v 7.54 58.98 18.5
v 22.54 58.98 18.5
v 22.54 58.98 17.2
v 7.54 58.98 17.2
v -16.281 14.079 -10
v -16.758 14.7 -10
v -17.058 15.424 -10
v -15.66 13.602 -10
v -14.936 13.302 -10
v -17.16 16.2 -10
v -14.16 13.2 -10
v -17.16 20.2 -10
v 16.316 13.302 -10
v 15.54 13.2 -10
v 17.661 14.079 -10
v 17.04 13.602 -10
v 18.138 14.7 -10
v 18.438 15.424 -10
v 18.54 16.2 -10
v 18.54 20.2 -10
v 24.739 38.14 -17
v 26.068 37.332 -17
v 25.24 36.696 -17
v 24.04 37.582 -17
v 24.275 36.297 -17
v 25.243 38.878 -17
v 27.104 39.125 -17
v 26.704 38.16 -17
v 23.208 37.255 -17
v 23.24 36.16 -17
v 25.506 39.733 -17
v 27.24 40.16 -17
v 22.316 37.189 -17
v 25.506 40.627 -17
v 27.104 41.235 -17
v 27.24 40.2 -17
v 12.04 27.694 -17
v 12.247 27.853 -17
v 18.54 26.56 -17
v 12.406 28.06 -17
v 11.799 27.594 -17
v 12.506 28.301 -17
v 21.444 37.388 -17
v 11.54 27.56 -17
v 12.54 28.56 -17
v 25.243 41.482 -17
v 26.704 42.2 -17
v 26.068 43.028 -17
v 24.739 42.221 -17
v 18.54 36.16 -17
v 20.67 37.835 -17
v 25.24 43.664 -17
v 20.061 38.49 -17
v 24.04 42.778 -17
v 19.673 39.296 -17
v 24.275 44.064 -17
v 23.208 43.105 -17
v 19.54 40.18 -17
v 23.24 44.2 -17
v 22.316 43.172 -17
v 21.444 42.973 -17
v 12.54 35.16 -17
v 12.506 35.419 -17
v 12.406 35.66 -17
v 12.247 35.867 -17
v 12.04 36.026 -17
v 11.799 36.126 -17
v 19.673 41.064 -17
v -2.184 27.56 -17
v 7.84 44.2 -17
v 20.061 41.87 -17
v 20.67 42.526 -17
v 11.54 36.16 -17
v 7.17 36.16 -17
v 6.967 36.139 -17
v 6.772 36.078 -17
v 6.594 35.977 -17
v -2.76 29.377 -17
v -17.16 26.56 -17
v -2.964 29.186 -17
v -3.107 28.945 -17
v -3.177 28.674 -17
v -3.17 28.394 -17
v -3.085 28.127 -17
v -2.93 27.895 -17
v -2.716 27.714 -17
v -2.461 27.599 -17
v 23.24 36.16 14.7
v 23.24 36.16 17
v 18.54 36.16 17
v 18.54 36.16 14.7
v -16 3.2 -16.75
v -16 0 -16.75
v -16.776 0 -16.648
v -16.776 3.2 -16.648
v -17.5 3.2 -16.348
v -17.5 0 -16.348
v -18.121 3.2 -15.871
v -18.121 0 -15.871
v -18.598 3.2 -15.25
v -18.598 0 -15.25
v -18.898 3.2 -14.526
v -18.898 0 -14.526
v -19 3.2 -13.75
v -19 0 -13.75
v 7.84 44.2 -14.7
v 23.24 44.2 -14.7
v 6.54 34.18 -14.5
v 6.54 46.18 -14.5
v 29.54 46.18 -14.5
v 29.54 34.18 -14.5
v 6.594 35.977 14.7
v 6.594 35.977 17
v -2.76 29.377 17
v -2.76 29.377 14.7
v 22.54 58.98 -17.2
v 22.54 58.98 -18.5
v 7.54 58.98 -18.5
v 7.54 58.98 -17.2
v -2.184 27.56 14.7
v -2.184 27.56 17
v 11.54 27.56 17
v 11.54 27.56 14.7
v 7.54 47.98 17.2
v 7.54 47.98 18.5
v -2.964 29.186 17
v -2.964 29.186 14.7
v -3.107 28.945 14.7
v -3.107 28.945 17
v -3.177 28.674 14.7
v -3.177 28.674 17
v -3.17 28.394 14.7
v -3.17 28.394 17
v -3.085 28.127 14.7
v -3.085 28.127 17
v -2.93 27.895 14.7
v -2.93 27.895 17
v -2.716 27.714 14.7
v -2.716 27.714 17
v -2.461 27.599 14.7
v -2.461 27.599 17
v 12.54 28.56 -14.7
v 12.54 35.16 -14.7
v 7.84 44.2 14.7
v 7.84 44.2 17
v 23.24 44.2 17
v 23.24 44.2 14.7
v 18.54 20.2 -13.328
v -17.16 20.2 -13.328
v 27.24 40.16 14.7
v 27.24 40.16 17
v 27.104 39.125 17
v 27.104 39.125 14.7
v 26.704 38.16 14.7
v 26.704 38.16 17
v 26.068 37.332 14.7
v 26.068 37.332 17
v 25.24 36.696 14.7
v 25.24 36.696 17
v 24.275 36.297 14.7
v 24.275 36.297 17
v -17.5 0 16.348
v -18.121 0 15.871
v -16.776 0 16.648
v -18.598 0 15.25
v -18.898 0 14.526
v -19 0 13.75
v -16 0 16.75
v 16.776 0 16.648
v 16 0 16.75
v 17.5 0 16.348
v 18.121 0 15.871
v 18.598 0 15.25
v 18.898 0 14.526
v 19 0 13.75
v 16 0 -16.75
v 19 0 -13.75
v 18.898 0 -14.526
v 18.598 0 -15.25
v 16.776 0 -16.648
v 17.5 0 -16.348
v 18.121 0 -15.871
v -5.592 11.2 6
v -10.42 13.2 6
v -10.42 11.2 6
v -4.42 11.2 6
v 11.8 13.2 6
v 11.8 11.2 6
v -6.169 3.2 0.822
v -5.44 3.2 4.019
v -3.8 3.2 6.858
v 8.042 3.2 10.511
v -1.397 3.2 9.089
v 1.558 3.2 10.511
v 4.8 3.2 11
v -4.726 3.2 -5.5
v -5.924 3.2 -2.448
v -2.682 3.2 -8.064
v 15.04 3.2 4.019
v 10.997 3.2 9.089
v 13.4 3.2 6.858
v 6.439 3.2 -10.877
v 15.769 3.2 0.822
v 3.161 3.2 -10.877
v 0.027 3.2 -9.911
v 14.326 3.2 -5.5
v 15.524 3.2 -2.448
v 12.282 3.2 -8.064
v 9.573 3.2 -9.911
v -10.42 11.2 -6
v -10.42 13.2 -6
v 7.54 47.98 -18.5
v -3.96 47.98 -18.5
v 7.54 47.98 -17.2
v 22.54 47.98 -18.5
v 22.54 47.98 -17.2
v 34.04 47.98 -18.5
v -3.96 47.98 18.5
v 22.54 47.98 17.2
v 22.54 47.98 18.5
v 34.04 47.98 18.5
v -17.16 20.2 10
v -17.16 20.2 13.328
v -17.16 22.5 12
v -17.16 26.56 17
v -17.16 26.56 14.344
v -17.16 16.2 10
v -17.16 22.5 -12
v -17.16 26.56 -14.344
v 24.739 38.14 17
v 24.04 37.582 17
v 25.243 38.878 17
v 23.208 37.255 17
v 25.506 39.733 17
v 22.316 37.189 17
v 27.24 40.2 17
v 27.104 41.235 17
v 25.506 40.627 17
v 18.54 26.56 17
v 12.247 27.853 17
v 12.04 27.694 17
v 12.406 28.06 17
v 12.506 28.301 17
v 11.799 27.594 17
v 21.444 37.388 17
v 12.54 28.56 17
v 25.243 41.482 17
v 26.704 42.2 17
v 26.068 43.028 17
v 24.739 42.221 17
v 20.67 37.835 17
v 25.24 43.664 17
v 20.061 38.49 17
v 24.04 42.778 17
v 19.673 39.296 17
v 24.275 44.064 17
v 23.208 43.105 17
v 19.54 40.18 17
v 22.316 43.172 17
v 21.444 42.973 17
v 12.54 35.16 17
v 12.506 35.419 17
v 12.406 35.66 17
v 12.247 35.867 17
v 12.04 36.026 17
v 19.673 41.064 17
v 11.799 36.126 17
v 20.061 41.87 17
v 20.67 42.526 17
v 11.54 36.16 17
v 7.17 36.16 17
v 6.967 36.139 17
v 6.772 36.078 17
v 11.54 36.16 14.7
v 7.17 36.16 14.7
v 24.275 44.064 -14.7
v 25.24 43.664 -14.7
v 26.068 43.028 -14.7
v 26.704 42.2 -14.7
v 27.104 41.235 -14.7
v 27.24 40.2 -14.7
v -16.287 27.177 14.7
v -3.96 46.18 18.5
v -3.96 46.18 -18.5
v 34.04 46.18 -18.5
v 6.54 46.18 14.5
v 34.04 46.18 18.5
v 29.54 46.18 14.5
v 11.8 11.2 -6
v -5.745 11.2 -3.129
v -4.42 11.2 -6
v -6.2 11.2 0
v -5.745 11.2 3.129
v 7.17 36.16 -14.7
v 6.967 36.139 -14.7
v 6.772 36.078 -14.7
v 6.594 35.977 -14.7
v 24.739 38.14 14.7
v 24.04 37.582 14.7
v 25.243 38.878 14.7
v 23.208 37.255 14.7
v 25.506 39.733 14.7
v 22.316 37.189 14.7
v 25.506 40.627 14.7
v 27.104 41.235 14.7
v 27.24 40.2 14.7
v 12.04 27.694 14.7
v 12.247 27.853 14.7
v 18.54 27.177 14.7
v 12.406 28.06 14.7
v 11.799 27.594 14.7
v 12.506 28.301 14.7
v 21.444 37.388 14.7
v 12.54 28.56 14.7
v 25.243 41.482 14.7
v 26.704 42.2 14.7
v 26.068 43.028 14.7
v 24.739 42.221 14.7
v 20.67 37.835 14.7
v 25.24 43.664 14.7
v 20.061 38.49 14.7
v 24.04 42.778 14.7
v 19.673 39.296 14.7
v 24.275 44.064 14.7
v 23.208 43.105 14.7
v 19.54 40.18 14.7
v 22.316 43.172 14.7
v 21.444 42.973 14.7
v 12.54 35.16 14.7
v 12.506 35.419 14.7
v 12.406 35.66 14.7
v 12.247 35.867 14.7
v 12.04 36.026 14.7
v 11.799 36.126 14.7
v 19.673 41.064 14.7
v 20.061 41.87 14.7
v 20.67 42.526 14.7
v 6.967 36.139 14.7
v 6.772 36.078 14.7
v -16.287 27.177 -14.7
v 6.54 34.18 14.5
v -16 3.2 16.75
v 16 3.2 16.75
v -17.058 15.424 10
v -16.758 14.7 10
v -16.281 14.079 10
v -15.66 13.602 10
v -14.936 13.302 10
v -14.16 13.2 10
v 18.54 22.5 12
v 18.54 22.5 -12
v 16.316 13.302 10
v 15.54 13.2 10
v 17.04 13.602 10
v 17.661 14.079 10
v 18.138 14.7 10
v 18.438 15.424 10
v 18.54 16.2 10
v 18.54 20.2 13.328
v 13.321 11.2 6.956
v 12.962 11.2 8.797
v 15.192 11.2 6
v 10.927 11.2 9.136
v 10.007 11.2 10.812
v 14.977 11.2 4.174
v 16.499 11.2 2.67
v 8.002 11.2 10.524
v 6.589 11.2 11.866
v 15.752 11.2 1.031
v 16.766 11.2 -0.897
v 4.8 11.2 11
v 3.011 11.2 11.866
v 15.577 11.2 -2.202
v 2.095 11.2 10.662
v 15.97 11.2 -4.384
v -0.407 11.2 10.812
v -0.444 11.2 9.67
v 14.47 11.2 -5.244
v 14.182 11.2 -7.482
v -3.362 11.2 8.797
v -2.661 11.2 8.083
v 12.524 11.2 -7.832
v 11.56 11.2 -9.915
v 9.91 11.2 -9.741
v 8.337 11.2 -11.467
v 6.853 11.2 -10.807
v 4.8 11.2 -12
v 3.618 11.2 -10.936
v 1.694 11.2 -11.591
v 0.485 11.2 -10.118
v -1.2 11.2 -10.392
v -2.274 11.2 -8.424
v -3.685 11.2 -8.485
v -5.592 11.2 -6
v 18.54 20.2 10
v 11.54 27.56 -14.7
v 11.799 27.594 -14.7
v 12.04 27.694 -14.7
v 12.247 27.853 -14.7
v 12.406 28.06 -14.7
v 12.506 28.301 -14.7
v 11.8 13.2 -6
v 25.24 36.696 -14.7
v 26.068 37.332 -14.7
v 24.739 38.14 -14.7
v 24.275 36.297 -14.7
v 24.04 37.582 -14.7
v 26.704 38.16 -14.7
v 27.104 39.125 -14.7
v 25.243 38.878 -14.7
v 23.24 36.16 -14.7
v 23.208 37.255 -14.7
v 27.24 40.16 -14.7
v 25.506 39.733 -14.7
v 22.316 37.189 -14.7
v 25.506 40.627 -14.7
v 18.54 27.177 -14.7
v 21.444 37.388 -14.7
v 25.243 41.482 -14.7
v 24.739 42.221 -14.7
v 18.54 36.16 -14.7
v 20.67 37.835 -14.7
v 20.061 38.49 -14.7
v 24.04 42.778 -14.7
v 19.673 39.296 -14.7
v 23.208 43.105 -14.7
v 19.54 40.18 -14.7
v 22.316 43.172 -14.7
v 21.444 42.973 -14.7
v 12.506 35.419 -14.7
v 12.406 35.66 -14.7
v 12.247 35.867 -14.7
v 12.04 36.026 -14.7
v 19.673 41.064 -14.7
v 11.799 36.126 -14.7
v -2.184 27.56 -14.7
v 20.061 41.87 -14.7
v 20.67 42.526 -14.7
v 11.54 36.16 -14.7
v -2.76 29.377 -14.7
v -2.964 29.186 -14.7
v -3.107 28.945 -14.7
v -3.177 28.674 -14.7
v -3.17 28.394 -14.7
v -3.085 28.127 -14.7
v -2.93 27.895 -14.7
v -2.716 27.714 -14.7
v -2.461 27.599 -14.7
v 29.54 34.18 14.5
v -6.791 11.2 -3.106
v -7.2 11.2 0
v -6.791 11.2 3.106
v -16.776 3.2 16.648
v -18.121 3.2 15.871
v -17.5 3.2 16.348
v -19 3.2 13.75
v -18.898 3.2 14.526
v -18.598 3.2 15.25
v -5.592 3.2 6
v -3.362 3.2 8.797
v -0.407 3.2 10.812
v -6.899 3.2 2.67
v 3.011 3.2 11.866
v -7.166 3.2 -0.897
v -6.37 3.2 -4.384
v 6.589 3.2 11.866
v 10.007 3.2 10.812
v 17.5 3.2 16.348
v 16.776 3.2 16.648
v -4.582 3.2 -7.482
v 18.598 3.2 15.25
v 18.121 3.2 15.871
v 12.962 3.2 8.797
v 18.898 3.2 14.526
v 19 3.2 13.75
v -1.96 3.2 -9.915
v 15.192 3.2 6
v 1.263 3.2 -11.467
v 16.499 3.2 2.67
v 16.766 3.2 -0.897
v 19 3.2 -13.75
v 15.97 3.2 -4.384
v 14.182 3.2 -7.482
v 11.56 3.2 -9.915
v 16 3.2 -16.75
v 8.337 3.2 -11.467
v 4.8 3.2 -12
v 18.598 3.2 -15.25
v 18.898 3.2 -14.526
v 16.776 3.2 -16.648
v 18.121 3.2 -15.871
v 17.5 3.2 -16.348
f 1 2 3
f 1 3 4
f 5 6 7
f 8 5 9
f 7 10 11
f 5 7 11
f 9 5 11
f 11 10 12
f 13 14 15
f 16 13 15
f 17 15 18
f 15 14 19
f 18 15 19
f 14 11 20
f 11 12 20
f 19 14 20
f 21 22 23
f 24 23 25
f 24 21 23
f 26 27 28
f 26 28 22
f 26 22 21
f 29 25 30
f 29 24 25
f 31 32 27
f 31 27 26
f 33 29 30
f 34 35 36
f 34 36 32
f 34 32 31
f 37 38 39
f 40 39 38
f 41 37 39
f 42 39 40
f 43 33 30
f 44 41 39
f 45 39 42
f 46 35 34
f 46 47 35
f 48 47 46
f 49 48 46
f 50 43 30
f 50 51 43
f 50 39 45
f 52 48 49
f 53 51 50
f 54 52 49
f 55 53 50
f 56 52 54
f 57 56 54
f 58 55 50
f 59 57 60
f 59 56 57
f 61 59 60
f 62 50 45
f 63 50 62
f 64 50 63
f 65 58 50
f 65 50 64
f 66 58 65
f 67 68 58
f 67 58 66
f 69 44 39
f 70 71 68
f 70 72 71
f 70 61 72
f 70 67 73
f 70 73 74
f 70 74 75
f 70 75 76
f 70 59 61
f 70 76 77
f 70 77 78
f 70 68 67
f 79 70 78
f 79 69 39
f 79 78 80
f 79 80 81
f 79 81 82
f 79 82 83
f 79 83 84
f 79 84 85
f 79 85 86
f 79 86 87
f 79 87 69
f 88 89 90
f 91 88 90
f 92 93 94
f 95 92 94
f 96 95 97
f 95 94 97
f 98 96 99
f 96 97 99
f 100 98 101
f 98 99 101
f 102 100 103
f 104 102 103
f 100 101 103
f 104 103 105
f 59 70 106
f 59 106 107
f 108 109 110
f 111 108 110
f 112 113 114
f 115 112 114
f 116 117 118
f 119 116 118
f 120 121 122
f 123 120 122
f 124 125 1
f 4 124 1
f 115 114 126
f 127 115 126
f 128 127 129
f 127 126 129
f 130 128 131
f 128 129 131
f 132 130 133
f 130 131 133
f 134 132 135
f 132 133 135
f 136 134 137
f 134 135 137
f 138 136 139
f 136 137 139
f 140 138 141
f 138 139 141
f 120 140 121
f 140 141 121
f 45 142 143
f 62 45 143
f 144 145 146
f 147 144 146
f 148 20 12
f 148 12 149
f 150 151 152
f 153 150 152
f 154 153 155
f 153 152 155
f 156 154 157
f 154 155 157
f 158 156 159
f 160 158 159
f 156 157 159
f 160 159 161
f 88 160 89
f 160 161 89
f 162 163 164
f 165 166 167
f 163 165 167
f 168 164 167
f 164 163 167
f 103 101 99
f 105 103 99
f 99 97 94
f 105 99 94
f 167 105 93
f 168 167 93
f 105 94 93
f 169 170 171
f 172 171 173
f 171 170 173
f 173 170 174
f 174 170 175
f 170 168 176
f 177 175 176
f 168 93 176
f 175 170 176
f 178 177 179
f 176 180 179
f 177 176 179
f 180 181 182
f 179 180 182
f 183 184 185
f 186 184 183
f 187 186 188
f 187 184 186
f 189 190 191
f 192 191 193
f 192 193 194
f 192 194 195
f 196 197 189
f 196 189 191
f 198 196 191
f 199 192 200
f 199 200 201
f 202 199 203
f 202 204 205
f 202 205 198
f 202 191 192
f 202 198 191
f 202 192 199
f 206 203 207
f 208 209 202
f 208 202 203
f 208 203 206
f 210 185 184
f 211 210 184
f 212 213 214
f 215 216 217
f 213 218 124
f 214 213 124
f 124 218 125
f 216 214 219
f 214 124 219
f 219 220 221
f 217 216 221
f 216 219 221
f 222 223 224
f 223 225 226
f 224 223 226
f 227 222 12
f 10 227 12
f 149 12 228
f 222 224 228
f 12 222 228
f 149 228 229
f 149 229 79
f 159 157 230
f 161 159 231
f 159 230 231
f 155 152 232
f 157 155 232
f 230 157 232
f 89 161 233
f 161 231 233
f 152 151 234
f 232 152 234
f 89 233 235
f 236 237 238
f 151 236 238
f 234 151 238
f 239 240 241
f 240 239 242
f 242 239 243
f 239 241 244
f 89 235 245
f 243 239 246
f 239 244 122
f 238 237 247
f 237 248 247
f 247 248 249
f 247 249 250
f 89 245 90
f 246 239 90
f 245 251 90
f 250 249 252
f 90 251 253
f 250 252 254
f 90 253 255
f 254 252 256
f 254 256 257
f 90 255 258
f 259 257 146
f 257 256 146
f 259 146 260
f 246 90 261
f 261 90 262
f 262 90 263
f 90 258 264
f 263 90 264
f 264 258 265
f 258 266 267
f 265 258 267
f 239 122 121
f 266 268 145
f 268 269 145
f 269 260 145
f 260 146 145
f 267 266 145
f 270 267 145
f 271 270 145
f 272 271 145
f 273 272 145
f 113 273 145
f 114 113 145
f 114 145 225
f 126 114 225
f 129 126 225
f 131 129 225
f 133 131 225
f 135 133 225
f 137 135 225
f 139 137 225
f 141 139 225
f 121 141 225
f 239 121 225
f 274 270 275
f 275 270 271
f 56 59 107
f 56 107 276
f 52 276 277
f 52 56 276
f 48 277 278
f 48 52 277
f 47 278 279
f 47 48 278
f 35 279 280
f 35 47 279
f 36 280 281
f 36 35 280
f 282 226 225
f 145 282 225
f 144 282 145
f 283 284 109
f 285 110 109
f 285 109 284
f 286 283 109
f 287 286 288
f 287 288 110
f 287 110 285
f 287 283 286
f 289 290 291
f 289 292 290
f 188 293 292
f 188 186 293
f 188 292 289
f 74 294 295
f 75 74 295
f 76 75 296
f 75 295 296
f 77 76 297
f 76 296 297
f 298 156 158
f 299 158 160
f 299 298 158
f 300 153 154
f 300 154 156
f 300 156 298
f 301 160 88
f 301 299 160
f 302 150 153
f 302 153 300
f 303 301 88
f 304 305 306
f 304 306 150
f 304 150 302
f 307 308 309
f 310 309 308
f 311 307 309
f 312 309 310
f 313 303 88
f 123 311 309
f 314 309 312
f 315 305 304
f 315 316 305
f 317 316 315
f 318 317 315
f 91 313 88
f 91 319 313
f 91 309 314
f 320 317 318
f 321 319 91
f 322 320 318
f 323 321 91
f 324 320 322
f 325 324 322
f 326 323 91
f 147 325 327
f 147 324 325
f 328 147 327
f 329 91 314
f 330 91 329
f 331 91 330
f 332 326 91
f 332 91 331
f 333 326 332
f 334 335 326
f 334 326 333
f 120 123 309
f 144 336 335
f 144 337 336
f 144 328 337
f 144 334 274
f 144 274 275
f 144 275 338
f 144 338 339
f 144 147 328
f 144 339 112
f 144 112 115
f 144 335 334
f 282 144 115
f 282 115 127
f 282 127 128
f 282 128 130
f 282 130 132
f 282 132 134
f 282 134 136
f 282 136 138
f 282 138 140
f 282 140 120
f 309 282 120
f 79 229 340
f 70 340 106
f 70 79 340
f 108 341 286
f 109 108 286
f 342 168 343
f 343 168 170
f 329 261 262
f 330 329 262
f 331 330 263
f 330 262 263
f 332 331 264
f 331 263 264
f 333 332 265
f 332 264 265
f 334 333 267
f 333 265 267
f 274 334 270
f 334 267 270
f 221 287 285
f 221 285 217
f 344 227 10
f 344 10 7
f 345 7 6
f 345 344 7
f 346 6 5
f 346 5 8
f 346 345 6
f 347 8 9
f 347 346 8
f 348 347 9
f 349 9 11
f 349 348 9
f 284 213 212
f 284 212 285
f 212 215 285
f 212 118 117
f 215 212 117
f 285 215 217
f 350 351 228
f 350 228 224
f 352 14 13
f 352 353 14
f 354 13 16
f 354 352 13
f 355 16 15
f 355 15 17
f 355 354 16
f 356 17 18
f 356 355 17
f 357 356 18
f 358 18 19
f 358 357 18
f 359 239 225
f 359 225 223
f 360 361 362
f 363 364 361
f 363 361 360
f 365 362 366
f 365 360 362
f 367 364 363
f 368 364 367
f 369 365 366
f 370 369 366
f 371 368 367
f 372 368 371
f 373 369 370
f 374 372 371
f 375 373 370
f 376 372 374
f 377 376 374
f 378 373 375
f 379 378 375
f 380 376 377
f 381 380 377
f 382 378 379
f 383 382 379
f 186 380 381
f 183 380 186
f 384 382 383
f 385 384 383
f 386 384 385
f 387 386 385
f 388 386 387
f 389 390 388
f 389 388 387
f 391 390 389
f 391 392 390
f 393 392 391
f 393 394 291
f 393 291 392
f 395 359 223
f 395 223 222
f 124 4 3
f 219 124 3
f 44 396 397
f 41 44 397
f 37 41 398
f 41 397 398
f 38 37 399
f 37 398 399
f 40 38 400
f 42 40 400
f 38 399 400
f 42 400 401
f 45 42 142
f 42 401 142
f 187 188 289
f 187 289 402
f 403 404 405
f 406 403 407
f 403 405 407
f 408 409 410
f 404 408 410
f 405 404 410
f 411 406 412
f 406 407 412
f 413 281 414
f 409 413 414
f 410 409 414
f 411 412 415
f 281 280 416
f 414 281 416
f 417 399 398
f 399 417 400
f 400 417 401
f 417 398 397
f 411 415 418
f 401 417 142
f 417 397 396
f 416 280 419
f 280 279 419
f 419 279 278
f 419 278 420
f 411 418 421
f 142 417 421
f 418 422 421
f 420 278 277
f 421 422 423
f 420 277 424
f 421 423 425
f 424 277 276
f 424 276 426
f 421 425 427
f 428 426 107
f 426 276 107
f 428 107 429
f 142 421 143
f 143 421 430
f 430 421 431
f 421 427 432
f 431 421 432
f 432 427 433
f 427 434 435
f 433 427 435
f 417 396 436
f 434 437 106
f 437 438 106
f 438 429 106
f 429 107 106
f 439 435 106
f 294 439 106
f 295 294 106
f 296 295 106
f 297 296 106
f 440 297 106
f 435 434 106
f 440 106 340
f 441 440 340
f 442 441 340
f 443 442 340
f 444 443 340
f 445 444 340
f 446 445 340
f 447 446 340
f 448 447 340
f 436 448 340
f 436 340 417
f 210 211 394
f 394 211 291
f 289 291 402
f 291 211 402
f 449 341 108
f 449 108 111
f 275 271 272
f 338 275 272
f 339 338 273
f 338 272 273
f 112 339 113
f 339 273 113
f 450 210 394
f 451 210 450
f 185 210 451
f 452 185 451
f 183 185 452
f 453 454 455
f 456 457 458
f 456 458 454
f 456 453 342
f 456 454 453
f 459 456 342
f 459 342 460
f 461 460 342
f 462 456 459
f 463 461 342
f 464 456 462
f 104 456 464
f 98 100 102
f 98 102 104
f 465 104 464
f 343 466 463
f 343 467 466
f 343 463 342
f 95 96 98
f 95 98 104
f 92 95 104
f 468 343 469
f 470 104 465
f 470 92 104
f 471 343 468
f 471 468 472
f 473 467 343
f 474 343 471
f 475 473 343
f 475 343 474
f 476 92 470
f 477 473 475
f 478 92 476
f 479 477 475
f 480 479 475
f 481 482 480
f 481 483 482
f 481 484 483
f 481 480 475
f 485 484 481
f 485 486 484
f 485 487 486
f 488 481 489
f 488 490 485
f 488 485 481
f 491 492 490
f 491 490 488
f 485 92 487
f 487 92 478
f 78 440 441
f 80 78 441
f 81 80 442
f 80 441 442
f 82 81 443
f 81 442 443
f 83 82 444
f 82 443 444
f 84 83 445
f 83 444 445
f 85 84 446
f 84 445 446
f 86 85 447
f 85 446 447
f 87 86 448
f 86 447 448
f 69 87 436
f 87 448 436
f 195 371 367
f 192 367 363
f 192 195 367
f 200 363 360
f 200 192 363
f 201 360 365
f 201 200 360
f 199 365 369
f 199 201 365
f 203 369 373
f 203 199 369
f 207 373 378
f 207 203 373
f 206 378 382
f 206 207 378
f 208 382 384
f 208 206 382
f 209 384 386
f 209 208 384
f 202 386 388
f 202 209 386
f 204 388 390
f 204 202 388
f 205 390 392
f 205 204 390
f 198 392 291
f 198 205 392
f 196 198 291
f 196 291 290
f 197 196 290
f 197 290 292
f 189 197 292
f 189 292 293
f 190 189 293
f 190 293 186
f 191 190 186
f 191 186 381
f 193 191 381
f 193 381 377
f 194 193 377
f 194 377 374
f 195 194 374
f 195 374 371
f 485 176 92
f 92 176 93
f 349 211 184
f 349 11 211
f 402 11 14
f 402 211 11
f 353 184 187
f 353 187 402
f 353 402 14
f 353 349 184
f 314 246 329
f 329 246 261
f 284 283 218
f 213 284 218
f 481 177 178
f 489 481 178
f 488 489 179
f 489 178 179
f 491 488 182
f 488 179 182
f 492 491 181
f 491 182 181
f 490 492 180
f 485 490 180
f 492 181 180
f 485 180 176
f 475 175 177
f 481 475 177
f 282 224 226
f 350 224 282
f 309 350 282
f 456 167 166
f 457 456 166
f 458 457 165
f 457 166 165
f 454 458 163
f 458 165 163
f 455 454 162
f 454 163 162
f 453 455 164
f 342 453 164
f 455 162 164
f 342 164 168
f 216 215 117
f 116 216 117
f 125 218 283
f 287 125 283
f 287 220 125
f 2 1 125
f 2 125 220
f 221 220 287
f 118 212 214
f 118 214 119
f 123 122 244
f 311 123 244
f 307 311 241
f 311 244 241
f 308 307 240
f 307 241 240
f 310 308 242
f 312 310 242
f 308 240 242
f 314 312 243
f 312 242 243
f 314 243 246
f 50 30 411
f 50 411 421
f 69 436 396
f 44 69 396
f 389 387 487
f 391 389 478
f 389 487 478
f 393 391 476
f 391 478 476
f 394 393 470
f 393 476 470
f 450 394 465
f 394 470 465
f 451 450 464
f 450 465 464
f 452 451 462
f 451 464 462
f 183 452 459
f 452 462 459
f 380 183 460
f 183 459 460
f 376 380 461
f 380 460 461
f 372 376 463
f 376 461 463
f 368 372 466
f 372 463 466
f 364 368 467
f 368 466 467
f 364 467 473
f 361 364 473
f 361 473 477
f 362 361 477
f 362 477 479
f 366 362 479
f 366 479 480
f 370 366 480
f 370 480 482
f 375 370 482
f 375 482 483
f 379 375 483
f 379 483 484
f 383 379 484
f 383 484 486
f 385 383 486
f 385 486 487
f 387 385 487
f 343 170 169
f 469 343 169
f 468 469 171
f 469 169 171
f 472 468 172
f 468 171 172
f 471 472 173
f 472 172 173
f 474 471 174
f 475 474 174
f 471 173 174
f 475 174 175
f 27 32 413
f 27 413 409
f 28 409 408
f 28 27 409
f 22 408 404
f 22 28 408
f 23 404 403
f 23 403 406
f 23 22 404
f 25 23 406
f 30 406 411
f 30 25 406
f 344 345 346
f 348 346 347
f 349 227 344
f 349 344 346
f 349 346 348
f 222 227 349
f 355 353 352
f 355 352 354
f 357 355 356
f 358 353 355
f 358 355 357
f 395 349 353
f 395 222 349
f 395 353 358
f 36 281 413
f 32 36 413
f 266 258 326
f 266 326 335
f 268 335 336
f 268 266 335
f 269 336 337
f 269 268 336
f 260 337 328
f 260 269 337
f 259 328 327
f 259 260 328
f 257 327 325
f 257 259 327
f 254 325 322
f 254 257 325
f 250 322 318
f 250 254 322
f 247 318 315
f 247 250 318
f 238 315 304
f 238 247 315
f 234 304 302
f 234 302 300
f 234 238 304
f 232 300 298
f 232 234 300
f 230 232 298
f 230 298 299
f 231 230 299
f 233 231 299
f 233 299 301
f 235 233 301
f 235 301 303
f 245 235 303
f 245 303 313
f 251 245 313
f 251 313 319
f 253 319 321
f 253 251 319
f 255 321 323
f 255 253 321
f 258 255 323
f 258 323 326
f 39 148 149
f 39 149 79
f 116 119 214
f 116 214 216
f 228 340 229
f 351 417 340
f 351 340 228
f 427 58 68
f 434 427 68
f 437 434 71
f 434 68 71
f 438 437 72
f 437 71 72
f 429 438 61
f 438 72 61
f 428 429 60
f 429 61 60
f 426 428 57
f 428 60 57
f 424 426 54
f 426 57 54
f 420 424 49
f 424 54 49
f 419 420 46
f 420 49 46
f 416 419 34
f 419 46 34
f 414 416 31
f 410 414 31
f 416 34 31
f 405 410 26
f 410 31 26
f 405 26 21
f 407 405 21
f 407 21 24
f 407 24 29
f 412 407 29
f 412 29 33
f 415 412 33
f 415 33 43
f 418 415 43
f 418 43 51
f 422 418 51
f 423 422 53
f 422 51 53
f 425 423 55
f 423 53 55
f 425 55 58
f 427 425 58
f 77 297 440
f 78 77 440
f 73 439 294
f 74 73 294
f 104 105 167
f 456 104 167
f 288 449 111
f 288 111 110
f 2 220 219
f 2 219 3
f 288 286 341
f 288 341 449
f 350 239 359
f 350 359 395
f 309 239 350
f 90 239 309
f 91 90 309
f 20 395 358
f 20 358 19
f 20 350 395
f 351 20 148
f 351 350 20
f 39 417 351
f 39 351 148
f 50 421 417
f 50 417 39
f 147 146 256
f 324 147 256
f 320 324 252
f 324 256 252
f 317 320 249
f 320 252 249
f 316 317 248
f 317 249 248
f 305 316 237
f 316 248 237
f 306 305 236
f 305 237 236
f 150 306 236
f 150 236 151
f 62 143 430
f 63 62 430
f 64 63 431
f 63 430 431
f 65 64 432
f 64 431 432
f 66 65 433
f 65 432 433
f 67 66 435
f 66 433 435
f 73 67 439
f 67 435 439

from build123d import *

# Parameters (mm, degrees)
SALIENTE_EXTRUIR1_DEPTH = 3.2
CROQUIS2_R              = 12
CROQUIS2_R_2            = 11
SALIENTE_EXTRUIR2_DEPTH = 8
CROQUIS3_W              = 22.22
CROQUIS3_H              = 2
SALIENTE_EXTRUIR3_DEPTH = 6
SALIENTE_EXTRUIR4_DEPTH = 10
SALIENTE_EXTRUIR5_DEPTH = 35.7
CORTAR_EXTRUIR1_DEPTH   = 45
CROQUIS7_R              = 3
SALIENTE_EXTRUIR6_DEPTH = 2.3
CROQUIS8_W              = 23
CROQUIS8_H              = 12
SALIENTE_EXTRUIR7_DEPTH = 14.5
CROQUIS9_W              = 38
CROQUIS9_H              = 1.8
SALIENTE_EXTRUIR8_DEPTH = 18.5
CROQUIS10_W             = 7.5
CROQUIS10_H             = 11
SALIENTE_EXTRUIR9_DEPTH = 1.3


with BuildPart() as part:
    # Croquis1 → Saliente-Extruir1 (new body)
    with BuildSketch(Plane(origin=(0, 0, 0), x_dir=(1, 0, 0), z_dir=(0, 1, 0))):
        with BuildLine():
            Line((-16, -16.75), (16, -16.75))
            ThreePointArc((16, -16.75), (18.121320344, -15.871320344), (19, -13.75))
            Line((19, -13.75), (19, 13.75))
            ThreePointArc((19, 13.75), (18.121320344, 15.871320344), (16, 16.75))
            Line((16, 16.75), (-16, 16.75))
            ThreePointArc((-16, 16.75), (-18.121320344, 15.871320344), (-19, 13.75))
            Line((-19, 13.75), (-19, -13.75))
            ThreePointArc((-19, -13.75), (-18.121320344, -15.871320344), (-16, -16.75))
        make_face()
    extrude(amount=SALIENTE_EXTRUIR1_DEPTH)

    # Croquis2 → Saliente-Extruir2 (add)
    with BuildSketch(Plane(origin=(0, 3.2, 0), x_dir=(1, 0, 0), z_dir=(0, 1, 0))):
        with Locations(Location((4.8, 0, 0), (0, 0, 90))):
            Circle(CROQUIS2_R)
        with Locations(Location((4.8, 0, 0), (0, 0, 270))):
            Circle(CROQUIS2_R_2, mode=Mode.SUBTRACT)
    extrude(amount=SALIENTE_EXTRUIR2_DEPTH)

    # Croquis3 → Saliente-Extruir3 (add, symmetric)
    with BuildSketch(Plane.XY):
        with Locations((0.69, 12.2)):
            Rectangle(CROQUIS3_W, CROQUIS3_H)
    extrude(amount=SALIENTE_EXTRUIR3_DEPTH, both=True)

    # Croquis4 → Saliente-Extruir4 (add, symmetric)
    with BuildSketch(Plane.XY):
        with BuildLine():
            Line((18.54, 20.2), (-17.16, 20.2))
            Line((-17.16, 20.2), (-17.16, 16.2))
            ThreePointArc((-17.16, 16.2), (-16.281320344, 14.078679656), (-14.16, 13.2))
            Line((-14.16, 13.2), (15.54, 13.2))
            ThreePointArc((15.54, 13.2), (17.661320344, 14.078679656), (18.54, 16.2))
            Line((18.54, 16.2), (18.54, 20.2))
        make_face()
    extrude(amount=SALIENTE_EXTRUIR4_DEPTH, both=True)

    # Croquis5 → Saliente-Extruir5 (add)
    with BuildSketch(Plane(origin=(18.54, 0, 0), x_dir=(0, 0, -1), z_dir=(1, 0, 0))):
        Polygon((0, 20.2), (0, 22.5), (-12, 22.5), (-14.7, 27.17653718), (-14.7, 44.2), (-17, 44.2), (-17, 26.560254038), (-13.327905619, 20.2), (-10, 20.2), align=None)
        Polygon((12, 22.5), (0, 22.5), (0, 20.2), (10, 20.2), (13.327905619, 20.2), (17, 26.560254038), (17, 44.2), (14.7, 44.2), (14.7, 27.17653718), align=None)
    extrude(amount=-SALIENTE_EXTRUIR5_DEPTH)

    # Croquis6 → Cortar-Extruir1 (cut, symmetric)
    with BuildSketch(Plane.XY):
        Polygon((-17.16, 26.560254038), (7.84, 44.2), (-17.16, 44.2), align=None)
        with BuildLine():
            Line((-2.18375281, 27.560254038), (11.54, 27.560254038))
            ThreePointArc((11.54, 27.560254038), (12.247106781, 27.853147257), (12.54, 28.560254038))
            Line((12.54, 28.560254038), (12.54, 35.160254038))
            ThreePointArc((12.54, 35.160254038), (12.247106781, 35.867360819), (11.54, 36.160254038))
            Line((11.54, 36.160254038), (7.170123394, 36.160254038))
            ThreePointArc((7.170123394, 36.160254038), (6.867700223, 36.113427803), (6.59359973, 35.97733449))
            Line((6.59359973, 35.97733449), (-2.760276474, 29.37733449))
            ThreePointArc((-2.760276474, 29.37733449), (-3.136926575, 28.257830867), (-2.18375281, 27.560254038))
        make_face()
    extrude(amount=CORTAR_EXTRUIR1_DEPTH, both=True, mode=Mode.SUBTRACT)

    # Croquis7 → Saliente-Extruir6 (add)
    with BuildSketch(Plane(origin=(0, 0, -17), x_dir=(-1, 0, 0), z_dir=(0, 0, -1))):
        with BuildLine():
            Line((-18.54, 44.2), (-23.24, 44.2))
            ThreePointArc((-23.24, 44.2), (-26.068427125, 43.028427125), (-27.24, 40.2))
            Line((-27.24, 40.2), (-27.24, 40.160254038))
            ThreePointArc((-27.24, 40.160254038), (-26.068427125, 37.331826913), (-23.24, 36.160254038))
            Line((-23.24, 36.160254038), (-18.54, 36.160254038))
            Line((-18.54, 36.160254038), (-18.54, 44.2))
        make_face()
        with Locations((-22.54, 40.180127019)):
            Circle(CROQUIS7_R, mode=Mode.SUBTRACT)
    saliente_extruir6 = extrude(amount=-SALIENTE_EXTRUIR6_DEPTH)

    # Simetría1: Saliente-Extruir6 across plane
    add(saliente_extruir6.mirror(Plane.XY))


with BuildPart() as body_2:
    # Croquis8 → Saliente-Extruir7 (new, symmetric)
    with BuildSketch(Plane.XY):
        with Locations((18.04, 40.180127019)):
            Rectangle(CROQUIS8_W, CROQUIS8_H)
    extrude(amount=SALIENTE_EXTRUIR7_DEPTH, both=True)

    # Croquis9 → Saliente-Extruir8 (add, symmetric)
    with BuildSketch(Plane.XY):
        with Locations((15.04, 47.080127019)):
            Rectangle(CROQUIS9_W, CROQUIS9_H)
    extrude(amount=SALIENTE_EXTRUIR8_DEPTH, both=True)

    # Croquis10 → Saliente-Extruir9 (add)
    with BuildSketch(Plane.XY.offset(18.5)):
        with Locations((11.29, 53.480127019)):
            Rectangle(CROQUIS10_W, CROQUIS10_H)
        with Locations((18.79, 53.480127019)):
            Rectangle(CROQUIS10_W, CROQUIS10_H)
    saliente_extruir9 = extrude(amount=-SALIENTE_EXTRUIR9_DEPTH)

    # Simetría2: Saliente-Extruir9 across plane
    add(saliente_extruir9.mirror(Plane.XY))


solid = Compound([part.part, body_2.part])
